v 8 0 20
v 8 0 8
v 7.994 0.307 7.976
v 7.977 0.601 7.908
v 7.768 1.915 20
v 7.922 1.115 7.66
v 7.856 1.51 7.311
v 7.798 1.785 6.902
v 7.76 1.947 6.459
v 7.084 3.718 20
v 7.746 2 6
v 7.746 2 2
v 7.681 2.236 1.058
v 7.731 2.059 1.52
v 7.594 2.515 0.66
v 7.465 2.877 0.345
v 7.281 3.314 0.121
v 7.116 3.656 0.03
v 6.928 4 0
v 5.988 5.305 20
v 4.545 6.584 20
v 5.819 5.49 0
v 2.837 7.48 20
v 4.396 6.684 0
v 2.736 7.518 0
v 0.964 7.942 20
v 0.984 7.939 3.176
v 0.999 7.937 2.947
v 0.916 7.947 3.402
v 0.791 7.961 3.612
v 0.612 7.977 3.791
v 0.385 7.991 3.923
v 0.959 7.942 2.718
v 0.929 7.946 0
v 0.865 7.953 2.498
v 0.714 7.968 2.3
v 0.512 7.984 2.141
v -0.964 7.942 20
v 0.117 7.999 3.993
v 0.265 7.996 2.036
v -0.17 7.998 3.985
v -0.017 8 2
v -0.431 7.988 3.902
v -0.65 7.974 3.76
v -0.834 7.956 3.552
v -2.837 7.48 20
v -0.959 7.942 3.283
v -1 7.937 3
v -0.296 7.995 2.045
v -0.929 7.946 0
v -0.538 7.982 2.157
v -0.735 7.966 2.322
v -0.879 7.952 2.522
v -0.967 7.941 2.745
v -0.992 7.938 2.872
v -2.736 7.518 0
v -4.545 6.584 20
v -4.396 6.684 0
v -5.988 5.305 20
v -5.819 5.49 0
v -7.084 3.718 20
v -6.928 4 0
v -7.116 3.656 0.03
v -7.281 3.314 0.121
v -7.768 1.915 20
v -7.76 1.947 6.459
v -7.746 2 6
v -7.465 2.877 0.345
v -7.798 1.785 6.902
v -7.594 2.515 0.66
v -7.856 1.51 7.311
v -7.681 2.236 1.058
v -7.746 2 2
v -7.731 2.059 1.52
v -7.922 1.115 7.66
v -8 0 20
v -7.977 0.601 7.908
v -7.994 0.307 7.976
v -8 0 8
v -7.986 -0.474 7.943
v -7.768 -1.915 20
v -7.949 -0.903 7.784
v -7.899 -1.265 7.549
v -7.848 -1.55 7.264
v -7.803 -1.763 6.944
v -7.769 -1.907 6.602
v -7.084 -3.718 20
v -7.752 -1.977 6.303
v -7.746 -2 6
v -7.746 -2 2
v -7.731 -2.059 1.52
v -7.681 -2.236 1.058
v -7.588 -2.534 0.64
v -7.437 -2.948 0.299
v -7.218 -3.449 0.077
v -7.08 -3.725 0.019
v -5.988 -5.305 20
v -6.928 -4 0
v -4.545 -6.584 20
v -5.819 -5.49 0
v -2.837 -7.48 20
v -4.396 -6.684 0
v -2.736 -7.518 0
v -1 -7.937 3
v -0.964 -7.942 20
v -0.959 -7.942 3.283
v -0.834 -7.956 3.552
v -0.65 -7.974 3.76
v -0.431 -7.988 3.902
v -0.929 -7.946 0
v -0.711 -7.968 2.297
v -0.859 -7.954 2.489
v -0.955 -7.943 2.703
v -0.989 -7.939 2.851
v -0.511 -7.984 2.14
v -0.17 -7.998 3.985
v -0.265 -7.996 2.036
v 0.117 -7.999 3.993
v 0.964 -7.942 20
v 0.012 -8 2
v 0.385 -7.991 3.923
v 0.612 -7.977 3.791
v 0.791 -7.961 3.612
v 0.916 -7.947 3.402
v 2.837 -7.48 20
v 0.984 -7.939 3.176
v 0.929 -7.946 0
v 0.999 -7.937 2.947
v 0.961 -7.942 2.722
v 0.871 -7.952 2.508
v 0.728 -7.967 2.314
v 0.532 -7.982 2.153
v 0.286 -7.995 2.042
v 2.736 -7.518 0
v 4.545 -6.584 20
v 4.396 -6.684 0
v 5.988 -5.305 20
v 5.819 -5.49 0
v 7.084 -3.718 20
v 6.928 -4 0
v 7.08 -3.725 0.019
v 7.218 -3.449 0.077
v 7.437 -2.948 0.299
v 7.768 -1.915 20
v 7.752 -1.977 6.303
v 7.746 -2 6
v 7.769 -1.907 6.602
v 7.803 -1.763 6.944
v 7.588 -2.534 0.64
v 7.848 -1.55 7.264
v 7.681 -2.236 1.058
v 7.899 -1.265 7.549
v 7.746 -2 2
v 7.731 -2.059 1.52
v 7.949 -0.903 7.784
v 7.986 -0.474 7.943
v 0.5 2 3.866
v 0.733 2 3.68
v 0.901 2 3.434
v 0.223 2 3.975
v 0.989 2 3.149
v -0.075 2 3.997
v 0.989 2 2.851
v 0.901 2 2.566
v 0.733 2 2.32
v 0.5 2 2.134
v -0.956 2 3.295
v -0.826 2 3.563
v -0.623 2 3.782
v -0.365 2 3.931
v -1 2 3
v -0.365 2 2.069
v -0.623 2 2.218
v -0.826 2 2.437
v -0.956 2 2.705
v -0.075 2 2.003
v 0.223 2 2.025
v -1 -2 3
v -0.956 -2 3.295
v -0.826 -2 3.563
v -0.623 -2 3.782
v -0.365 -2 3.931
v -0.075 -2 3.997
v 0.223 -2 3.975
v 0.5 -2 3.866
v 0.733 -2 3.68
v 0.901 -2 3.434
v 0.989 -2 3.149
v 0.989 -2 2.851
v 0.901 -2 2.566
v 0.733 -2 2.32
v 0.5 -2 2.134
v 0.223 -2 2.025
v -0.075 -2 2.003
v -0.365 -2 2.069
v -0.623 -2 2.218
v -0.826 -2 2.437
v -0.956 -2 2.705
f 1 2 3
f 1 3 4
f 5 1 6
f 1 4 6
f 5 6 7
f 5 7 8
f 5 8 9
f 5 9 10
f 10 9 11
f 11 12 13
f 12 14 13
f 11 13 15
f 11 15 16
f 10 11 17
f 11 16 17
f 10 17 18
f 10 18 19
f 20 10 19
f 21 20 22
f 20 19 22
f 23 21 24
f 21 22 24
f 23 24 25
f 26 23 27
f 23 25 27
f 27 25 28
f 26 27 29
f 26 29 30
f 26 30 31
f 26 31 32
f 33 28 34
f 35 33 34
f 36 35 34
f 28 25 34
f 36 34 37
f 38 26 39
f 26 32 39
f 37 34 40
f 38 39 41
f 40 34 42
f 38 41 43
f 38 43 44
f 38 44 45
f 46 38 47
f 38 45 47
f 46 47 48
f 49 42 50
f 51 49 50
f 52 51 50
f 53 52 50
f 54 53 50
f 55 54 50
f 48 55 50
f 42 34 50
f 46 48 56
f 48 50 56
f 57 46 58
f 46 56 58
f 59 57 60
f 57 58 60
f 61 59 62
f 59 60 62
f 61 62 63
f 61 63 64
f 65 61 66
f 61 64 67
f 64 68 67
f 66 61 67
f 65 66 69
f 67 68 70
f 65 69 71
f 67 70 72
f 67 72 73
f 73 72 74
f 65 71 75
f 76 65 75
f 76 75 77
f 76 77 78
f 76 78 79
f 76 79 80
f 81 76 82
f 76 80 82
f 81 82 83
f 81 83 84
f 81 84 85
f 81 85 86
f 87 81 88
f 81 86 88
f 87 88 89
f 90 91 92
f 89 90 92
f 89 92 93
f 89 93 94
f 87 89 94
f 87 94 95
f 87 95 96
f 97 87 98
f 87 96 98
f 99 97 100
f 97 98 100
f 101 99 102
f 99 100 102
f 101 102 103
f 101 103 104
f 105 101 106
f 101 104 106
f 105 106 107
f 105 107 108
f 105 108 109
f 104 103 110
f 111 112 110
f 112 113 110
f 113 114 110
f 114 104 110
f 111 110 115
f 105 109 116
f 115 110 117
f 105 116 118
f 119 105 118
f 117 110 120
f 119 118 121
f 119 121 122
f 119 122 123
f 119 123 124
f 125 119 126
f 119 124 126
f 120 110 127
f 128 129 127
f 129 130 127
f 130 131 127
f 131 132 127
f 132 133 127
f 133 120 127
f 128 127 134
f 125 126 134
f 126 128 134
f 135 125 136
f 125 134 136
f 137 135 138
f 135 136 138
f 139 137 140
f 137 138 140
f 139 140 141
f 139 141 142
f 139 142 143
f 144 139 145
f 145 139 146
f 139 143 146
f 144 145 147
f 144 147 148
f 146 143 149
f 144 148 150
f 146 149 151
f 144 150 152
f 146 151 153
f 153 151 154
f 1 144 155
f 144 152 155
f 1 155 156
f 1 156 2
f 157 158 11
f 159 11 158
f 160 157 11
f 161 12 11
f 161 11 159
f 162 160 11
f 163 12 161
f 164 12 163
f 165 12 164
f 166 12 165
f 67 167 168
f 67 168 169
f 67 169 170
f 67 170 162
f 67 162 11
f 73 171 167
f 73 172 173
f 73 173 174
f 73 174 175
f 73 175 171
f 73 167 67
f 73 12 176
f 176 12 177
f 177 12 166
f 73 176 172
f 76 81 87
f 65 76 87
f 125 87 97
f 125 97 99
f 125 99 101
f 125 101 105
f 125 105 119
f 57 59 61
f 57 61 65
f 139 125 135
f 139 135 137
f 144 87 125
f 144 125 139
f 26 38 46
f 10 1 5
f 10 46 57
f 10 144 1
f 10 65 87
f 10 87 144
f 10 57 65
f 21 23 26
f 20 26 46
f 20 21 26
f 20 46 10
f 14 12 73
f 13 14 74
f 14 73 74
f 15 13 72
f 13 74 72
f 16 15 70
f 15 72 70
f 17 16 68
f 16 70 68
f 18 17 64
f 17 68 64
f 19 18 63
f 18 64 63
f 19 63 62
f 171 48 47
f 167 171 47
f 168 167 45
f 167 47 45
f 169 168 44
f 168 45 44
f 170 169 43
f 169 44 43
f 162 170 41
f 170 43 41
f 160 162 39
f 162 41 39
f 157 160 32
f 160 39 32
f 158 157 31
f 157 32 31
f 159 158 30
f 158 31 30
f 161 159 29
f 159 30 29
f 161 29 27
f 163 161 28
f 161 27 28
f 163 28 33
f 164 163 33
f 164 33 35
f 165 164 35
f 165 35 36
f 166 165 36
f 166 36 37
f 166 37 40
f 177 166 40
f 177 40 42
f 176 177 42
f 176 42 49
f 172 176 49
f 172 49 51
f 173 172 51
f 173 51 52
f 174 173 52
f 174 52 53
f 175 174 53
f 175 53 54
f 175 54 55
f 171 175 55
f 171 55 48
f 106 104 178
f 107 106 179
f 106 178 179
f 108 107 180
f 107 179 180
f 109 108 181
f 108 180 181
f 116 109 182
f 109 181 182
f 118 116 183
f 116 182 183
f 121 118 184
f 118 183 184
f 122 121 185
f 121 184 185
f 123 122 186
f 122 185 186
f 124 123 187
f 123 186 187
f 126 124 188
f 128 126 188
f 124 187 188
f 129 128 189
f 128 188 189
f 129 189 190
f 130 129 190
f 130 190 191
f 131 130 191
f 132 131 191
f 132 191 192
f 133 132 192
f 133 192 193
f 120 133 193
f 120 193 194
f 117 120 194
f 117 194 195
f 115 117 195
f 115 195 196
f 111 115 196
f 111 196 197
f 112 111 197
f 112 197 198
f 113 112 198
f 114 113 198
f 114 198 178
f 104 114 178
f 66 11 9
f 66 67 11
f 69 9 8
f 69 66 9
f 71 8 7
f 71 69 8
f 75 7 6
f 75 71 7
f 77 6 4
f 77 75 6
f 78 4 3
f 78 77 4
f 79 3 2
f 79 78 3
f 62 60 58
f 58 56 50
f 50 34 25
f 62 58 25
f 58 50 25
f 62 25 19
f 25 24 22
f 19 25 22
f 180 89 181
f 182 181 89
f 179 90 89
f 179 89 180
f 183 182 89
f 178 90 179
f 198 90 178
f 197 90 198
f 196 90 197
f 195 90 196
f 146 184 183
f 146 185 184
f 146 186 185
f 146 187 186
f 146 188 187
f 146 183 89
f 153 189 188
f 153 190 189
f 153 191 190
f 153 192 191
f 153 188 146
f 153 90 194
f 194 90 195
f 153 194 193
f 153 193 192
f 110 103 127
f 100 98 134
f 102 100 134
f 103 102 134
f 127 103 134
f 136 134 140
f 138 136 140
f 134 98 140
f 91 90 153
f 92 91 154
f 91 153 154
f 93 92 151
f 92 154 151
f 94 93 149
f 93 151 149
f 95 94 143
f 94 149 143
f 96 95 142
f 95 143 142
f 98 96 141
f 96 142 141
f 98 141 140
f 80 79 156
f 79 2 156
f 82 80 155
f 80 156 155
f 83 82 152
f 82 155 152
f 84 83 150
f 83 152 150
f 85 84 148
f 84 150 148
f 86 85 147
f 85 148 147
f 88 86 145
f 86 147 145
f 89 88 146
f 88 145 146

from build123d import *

# Parameters (mm, degrees)
F0_R     = 8
F1_DEPTH = 20
F3_DEPTH = 8
F5_D     = 2
F5_DEPTH = 6.001
F7_D     = 2
F8_R     = 2
F9_R     = 1.9999


# Not quite as in the source:
# - a fillet or chamfer is up to 0.001 mm smaller than in the source, because OpenCascade refuses the exact size


with BuildPart() as f1:
    # F0 (on Top) → F1 (new body)
    with BuildSketch(Plane.XY):
        Circle(F0_R)
    extrude(amount=F1_DEPTH)

    # F2 (on face) → F3 (cut)
    with BuildSketch(Plane.XY):
        with BuildLine():
            ThreePointArc((8, 0), (7.9362375701, 1.0080343399), (7.7459666924, 2))
            Line((7.7459666924, 2), (-7.7459666924, 2))
            ThreePointArc((-7.7459666924, 2), (-7.9362375701, 1.0080343399), (-8, 0))
            ThreePointArc((-8, 0), (-7.9362375701, -1.0080343399), (-7.7459666924, -2))
            Line((-7.7459666924, -2), (7.7459666924, -2))
            ThreePointArc((7.7459666924, -2), (7.9362375701, -1.0080343399), (8, 0))
        make_face()
    extrude(amount=F3_DEPTH, mode=Mode.SUBTRACT)

    # F5 (through all, one way)
    with BuildSketch(Plane(origin=(0, -2, 0), x_dir=(-1, 0, 0), z_dir=(0, 1, 0))):
        with Locations((0, 3)):
            Circle(F5_D / 2)
    extrude(amount=-F5_DEPTH, mode=Mode.SUBTRACT)

    # F7 (through all)
    with Locations(Plane.XZ.offset(-2)):
        with Locations((0, 3)):
            Hole(F7_D / 2)

    # F8
    f8_edges = [f1.edges().sort_by_distance(p)[0] for p in [
        (0, 2, 0),
        (0, -2, 0),
    ]]
    fillet(f8_edges, radius=F8_R)

    # F9 (radius 2 in the source; OpenCascade refuses exactly that, so slightly less here)
    f9_edges = [f1.edges().sort_by_distance(p)[0] for p in [
        (0, 2, 8),
        (0, -2, 8),
    ]]
    fillet(f9_edges, radius=F9_R)


solid = f1.part
